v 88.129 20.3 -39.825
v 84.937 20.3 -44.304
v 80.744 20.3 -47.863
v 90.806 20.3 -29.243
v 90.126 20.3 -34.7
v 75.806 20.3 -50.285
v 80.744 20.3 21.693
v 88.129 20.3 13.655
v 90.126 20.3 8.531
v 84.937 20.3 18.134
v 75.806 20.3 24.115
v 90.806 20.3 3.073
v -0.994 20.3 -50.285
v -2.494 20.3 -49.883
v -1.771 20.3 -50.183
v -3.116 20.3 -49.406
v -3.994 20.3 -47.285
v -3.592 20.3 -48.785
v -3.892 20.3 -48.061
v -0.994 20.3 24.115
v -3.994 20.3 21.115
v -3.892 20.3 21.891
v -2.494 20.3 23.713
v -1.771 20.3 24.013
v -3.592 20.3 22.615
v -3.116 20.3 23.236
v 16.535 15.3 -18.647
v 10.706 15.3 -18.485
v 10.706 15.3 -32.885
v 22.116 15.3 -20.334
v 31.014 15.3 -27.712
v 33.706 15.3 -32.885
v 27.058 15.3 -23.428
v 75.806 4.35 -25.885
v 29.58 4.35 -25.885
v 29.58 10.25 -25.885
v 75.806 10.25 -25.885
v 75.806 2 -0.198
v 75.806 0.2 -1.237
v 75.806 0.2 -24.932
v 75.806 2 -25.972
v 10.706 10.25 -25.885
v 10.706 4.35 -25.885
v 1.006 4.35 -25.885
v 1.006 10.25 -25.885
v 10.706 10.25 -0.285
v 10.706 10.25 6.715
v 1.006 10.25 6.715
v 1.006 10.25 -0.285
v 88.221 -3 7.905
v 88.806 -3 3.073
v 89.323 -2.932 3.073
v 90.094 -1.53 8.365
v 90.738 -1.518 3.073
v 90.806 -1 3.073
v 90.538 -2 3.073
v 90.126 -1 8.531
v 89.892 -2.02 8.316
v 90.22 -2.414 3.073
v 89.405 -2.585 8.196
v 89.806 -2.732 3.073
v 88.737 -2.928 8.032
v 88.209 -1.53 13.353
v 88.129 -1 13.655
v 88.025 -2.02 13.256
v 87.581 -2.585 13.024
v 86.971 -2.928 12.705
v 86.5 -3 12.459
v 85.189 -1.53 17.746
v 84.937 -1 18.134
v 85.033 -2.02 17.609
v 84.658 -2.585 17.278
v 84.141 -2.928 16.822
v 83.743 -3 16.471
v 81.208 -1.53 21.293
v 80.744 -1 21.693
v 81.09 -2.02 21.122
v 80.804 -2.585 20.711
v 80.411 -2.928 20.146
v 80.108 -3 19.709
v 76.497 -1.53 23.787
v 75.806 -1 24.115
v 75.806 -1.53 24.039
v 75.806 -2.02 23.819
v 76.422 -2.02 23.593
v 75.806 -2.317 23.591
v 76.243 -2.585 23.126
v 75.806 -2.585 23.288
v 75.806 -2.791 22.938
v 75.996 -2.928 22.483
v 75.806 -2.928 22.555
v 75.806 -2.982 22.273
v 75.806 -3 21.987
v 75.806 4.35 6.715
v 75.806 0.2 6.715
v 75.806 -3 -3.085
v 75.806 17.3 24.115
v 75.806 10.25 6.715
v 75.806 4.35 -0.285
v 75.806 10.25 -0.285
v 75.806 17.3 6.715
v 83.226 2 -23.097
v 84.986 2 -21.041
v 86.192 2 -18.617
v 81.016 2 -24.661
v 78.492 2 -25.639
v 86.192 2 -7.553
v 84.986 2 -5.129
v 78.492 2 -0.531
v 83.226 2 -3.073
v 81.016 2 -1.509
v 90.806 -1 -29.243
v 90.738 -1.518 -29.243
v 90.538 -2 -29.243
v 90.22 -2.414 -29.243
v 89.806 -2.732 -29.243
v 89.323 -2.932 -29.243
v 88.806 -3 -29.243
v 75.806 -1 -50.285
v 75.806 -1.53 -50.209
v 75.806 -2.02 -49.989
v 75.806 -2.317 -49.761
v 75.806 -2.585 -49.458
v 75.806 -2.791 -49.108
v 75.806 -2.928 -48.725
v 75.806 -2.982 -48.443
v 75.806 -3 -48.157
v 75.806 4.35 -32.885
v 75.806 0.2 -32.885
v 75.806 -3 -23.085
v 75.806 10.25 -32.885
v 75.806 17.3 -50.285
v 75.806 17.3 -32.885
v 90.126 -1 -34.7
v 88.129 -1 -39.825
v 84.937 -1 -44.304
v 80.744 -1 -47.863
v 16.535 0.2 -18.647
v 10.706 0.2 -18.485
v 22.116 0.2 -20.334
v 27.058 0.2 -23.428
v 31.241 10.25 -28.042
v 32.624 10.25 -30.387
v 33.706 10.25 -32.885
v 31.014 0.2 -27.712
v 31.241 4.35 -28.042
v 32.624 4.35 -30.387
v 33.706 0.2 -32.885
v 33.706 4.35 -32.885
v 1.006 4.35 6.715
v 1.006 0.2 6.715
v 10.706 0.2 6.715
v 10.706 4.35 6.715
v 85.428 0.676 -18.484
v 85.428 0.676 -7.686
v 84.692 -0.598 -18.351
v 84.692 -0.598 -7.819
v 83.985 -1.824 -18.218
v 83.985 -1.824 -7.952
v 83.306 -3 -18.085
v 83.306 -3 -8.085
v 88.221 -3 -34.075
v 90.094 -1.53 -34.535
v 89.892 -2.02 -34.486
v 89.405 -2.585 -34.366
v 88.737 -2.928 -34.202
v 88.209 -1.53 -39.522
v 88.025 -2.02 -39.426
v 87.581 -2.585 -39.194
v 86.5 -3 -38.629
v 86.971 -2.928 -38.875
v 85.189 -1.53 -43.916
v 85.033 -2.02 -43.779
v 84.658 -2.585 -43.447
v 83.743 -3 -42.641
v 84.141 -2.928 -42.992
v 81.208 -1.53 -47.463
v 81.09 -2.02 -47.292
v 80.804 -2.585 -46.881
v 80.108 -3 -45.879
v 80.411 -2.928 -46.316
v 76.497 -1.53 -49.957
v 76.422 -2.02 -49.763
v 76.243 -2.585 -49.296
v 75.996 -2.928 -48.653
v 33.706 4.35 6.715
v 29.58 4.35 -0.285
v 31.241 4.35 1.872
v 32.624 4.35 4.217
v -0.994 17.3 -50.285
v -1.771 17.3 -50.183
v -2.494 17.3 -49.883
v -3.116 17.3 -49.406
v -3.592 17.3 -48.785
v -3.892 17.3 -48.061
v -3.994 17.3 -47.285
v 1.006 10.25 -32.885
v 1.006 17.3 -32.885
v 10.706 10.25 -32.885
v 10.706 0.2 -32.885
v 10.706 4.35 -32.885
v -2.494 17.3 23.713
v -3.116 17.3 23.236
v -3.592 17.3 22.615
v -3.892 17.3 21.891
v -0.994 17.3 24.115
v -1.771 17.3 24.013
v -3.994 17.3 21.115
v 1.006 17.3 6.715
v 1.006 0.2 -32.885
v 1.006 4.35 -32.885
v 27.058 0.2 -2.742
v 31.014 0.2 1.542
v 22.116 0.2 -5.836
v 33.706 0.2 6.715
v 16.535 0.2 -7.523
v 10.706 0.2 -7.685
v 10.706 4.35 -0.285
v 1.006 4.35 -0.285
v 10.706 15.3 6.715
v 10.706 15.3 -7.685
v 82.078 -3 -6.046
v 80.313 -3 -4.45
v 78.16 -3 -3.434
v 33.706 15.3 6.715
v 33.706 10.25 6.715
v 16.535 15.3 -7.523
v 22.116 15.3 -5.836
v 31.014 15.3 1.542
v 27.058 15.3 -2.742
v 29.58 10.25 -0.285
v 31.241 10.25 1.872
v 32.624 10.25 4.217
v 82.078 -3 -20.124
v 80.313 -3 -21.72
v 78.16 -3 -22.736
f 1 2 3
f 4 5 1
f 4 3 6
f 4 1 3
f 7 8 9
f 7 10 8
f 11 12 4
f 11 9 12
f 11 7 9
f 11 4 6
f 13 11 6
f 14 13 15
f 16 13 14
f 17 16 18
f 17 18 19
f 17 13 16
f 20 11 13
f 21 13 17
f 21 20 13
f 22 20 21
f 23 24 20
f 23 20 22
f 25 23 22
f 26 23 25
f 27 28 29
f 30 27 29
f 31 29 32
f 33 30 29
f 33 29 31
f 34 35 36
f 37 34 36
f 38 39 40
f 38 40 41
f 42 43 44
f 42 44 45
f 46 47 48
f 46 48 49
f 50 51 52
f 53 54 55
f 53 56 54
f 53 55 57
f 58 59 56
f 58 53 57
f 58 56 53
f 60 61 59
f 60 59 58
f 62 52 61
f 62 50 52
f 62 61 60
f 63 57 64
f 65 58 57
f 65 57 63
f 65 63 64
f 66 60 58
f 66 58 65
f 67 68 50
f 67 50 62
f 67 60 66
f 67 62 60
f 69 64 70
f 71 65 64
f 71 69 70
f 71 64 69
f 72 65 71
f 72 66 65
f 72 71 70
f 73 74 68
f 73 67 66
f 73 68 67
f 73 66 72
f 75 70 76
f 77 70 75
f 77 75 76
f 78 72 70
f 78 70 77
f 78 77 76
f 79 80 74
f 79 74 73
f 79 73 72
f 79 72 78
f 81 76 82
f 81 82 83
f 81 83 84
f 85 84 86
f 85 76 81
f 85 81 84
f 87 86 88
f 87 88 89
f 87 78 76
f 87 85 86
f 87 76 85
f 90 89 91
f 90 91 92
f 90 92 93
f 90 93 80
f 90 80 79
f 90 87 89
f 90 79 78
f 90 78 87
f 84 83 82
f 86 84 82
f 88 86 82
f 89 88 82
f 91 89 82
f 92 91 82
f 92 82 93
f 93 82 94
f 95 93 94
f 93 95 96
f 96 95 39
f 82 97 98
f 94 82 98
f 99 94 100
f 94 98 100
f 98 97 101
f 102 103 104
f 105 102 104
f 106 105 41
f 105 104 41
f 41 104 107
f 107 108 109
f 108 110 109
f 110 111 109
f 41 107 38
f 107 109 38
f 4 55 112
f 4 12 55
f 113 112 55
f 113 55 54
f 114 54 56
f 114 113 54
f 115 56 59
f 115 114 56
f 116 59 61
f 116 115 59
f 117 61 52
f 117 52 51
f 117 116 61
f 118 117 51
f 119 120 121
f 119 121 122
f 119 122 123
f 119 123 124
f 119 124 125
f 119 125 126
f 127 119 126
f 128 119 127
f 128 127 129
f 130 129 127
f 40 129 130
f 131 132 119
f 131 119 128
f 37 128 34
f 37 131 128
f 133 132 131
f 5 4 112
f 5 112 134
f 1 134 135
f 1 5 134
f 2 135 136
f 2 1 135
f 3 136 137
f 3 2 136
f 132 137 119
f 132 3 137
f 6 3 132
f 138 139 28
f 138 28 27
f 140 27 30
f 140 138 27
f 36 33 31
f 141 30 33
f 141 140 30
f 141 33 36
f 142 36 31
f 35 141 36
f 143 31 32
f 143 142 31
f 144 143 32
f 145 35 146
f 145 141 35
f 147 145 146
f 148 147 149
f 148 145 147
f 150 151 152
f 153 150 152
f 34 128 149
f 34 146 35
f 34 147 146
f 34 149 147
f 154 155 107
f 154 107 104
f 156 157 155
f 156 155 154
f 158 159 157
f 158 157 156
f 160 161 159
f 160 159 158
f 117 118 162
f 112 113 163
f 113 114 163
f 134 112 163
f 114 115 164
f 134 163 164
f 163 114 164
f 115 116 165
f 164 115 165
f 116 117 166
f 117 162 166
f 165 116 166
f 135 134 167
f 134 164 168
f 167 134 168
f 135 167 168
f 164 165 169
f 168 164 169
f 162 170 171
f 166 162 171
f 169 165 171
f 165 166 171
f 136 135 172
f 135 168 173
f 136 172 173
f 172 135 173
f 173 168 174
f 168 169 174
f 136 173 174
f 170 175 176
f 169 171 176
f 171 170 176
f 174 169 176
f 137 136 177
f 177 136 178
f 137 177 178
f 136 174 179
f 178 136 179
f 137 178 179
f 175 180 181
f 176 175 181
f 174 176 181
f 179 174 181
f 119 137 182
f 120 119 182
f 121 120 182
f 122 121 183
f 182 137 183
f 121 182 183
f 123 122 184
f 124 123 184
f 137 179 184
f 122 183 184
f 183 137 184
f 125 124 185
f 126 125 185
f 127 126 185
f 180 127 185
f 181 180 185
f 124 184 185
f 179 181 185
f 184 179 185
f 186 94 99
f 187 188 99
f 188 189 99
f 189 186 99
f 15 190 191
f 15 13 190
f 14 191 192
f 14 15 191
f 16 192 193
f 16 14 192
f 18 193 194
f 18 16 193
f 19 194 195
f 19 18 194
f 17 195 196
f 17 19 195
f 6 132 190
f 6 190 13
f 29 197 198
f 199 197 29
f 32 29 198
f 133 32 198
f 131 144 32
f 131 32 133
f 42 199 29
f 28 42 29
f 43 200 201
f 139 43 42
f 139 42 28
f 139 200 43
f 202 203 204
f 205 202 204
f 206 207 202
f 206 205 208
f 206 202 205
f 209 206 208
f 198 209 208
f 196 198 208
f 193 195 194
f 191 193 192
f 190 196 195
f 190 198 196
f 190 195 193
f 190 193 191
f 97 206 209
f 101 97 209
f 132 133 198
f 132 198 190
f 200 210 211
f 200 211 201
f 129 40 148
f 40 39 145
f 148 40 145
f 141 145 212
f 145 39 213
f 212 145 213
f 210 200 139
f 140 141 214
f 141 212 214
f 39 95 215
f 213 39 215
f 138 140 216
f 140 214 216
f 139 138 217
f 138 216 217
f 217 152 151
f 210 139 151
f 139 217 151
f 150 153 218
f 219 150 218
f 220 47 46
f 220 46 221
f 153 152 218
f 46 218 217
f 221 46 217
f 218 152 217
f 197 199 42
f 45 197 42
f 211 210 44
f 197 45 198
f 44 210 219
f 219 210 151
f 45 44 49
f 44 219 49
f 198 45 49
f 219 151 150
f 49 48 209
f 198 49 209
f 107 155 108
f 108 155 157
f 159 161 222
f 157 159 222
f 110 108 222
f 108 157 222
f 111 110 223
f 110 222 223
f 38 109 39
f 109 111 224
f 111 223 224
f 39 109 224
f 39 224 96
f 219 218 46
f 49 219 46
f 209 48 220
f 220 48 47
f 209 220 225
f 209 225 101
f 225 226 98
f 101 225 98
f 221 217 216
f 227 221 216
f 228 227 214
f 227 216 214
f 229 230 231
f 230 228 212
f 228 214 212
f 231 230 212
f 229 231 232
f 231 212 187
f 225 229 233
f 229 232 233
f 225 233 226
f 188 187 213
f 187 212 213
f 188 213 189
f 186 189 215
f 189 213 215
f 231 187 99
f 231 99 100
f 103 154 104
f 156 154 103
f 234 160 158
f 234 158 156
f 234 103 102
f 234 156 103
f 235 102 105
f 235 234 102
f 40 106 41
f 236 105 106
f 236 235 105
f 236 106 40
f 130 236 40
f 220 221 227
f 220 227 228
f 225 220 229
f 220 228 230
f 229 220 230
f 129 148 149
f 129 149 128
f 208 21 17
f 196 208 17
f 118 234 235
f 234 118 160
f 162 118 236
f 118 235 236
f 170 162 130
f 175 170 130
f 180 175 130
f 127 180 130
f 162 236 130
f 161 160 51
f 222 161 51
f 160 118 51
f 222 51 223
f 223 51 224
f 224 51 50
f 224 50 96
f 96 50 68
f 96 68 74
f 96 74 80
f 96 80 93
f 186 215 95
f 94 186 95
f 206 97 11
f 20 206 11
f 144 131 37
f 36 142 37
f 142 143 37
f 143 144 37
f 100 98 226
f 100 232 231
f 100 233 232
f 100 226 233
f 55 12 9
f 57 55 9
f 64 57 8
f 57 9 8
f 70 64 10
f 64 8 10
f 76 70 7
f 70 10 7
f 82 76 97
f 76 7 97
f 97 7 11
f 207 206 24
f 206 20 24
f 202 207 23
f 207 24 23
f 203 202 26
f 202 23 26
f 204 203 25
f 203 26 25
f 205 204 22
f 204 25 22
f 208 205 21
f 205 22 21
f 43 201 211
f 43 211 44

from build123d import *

# Parameters (mm, degrees)
BOSS_EXTRUDE1_DEPTH = 15.3
SKETCH4_W           = 7
SKETCH4_H           = 5.9
CUT_EXTRUDE1_DEPTH  = 78.461901488
SKETCH5_W           = 74.8
SKETCH5_H           = 19.8
BOSS_EXTRUDE2_DEPTH = 2
SKETCH6_W           = 74.8
SKETCH6_H           = 3
BOSS_EXTRUDE3_DEPTH = 37.2
SKETCH7_W           = 37.2
SKETCH7_H           = 3
BOSS_EXTRUDE4_DEPTH = 5
FILLET1_R           = 3
BOSS_EXTRUDE5_DEPTH = 23.3
FILLET2_R           = 2
SKETCH10_W          = 74.8
SKETCH10_H          = 19.8
CUT_EXTRUDE2_DEPTH  = 0.2
CUT_EXTRUDE3_DEPTH  = 5
CUT_EXTRUDE3_DRAFT  = 30
BOSS_EXTRUDE6_DEPTH = 15


with BuildPart() as part:
    # Sketch1 → Boss-Extrude1 (new body)
    with BuildSketch(Plane(origin=(0, 0, 0), x_dir=(1, 0, 0), z_dir=(0, 1, 0))):
        with BuildLine():
            Line((1.005677457, 13.08496015), (1.005677457, -6.71503985))
            Line((1.005677457, -6.71503985), (10.705677457, -6.71503985))
            Line((10.705677457, -6.71503985), (10.705677457, 7.68496015))
            ThreePointArc((10.705677457, 7.68496015), (24.690281417, 4.453424809), (33.705677457, -6.71503985))
            Line((33.705677457, -6.71503985), (75.805677457, -6.71503985))
            Line((75.805677457, -6.71503985), (75.805677457, 13.08496015))
            Line((75.805677457, 13.08496015), (1.005677457, 13.08496015))
        make_face()
    extrude(amount=BOSS_EXTRUDE1_DEPTH)

    # Sketch4 → Cut-Extrude1 (cut, through all)
    with BuildSketch(Plane(origin=(75.805677457, 0, 0), x_dir=(0, 0, -1), z_dir=(1, 0, 0))):
        with Locations((-3.21503985, 7.3)):
            Rectangle(SKETCH4_W, SKETCH4_H)
    extrude(amount=-CUT_EXTRUDE1_DEPTH, mode=Mode.SUBTRACT)

    # Sketch5 → Boss-Extrude2 (add)
    with BuildSketch(Plane(origin=(0, 15.3, 0), x_dir=(1, 0, 0), z_dir=(0, 1, 0))):
        with Locations((38.405677457, 3.18496015)):
            Rectangle(SKETCH5_W, SKETCH5_H)
    extrude(amount=BOSS_EXTRUDE2_DEPTH)

    # Sketch6 → Boss-Extrude3 (add)
    with BuildSketch(Plane(origin=(0, 0, -13.08496015), x_dir=(-1, 0, 0), z_dir=(0, 0, -1))):
        with Locations((-38.405677457, 18.8)):
            Rectangle(SKETCH6_W, SKETCH6_H)
    extrude(amount=-BOSS_EXTRUDE3_DEPTH)

    # Sketch7 → Boss-Extrude4 (add)
    with BuildSketch(Plane.ZY.offset(-1.005677457)):
        with Locations((5.51503985, 18.8)):
            Rectangle(SKETCH7_W, SKETCH7_H)
    extrude(amount=BOSS_EXTRUDE4_DEPTH)

    # Fillet1
    fillet1_edges = [part.edges().sort_by_distance(p)[0] for p in [
        (-3.994322543, 18.8, 24.11503985),
    ]]
    fillet(fillet1_edges, radius=FILLET1_R)

    # Sketch8 → Boss-Extrude5 (add)
    with BuildSketch(Plane(origin=(0, 20.3, 0), x_dir=(1, 0, 0), z_dir=(0, 1, 0))):
        with BuildLine():
            Line((75.805677457, 13.08496015), (90.805677457, 13.08496015))
            Line((90.805677457, 13.08496015), (90.805677457, -3.072659154))
            ThreePointArc((90.805677457, -3.072659154), (86.671822493, -15.993396221), (75.805677457, -24.11503985))
            Line((75.805677457, -24.11503985), (75.805677457, 13.08496015))
        make_face()
    extrude(amount=-BOSS_EXTRUDE5_DEPTH)

    # Fillet2
    fillet2_edges = [part.edges().sort_by_distance(p)[0] for p in [
        (90.805677457, -3, -5.006150498),
        (86.671822493, -3, 15.993396221),
    ]]
    fillet(fillet2_edges, radius=FILLET2_R)

    # Sketch10 → Cut-Extrude2 (cut)
    with BuildSketch(Plane(origin=(0, 0, 0), x_dir=(-1, 0, 0), z_dir=(0, -1, 0))):
        with Locations((-38.405677457, 3.18496015)):
            Rectangle(SKETCH10_W, SKETCH10_H)
    extrude(amount=-CUT_EXTRUDE2_DEPTH, mode=Mode.SUBTRACT)


with BuildPart() as cut_extrude3_tool:
    # Sketch11 → Cut-Extrude3 (with draft: the straight prism first)
    with BuildSketch(Plane(origin=(0, -3, 0), x_dir=(-1, 0, 0), z_dir=(0, -1, 0))):
        with BuildLine():
            Line((-75.805677457, 13.08496015), (-83.305677457, 13.08496015))
            Line((-83.305677457, 13.08496015), (-83.305677457, 8.08496015))
            ThreePointArc((-83.305677457, 8.08496015), (-80.312616551, 4.449551508), (-75.805677457, 3.08496015))
            Line((-75.805677457, 3.08496015), (-75.805677457, 13.08496015))
        make_face()
    extrude(amount=-CUT_EXTRUDE3_DEPTH)
    # Cut-Extrude3: the draft: its side faces are tilted about the plane it starts from
    cut_extrude3_sides = [cut_extrude3_tool.faces().sort_by_distance(p)[0] for p in [
        (75.805677457, -0.5, -8.08496015),
        (79.555677457, -0.5, -13.08496015),
        (83.305677457, -0.5, -10.58496015),
        (80.312616551, -0.5, -4.449551508),
    ]]
    draft(cut_extrude3_sides, Plane(origin=(0, -3, 0), x_dir=(-1, 0, 0), z_dir=(0, -1, 0)), CUT_EXTRUDE3_DRAFT)


with BuildPart() as part_1:
    add(part.part)

    # Cut-Extrude3: cut by cut_extrude3_tool
    add(cut_extrude3_tool.part, mode=Mode.SUBTRACT)

    # Sketch14 → Boss-Extrude6 (add)
    with BuildSketch(Plane(origin=(0, 0, -13.08496015), x_dir=(-1, 0, 0), z_dir=(0, 0, -1))):
        Polygon((-72.918926111, 2), (-73.958156595, 0.2), (-75.805677457, 0.2), (-75.805677457, 2), align=None)
    extrude(amount=-BOSS_EXTRUDE6_DEPTH)

    # Mirror1: part across plane


with BuildPart() as part_2:
    add(part_1.part)
    add(part_1.part.mirror(Plane(origin=(0, 15.3, -13.08496015), x_dir=(1, 0, 0), z_dir=(0, 0, -1))))


solid = part_2.part
